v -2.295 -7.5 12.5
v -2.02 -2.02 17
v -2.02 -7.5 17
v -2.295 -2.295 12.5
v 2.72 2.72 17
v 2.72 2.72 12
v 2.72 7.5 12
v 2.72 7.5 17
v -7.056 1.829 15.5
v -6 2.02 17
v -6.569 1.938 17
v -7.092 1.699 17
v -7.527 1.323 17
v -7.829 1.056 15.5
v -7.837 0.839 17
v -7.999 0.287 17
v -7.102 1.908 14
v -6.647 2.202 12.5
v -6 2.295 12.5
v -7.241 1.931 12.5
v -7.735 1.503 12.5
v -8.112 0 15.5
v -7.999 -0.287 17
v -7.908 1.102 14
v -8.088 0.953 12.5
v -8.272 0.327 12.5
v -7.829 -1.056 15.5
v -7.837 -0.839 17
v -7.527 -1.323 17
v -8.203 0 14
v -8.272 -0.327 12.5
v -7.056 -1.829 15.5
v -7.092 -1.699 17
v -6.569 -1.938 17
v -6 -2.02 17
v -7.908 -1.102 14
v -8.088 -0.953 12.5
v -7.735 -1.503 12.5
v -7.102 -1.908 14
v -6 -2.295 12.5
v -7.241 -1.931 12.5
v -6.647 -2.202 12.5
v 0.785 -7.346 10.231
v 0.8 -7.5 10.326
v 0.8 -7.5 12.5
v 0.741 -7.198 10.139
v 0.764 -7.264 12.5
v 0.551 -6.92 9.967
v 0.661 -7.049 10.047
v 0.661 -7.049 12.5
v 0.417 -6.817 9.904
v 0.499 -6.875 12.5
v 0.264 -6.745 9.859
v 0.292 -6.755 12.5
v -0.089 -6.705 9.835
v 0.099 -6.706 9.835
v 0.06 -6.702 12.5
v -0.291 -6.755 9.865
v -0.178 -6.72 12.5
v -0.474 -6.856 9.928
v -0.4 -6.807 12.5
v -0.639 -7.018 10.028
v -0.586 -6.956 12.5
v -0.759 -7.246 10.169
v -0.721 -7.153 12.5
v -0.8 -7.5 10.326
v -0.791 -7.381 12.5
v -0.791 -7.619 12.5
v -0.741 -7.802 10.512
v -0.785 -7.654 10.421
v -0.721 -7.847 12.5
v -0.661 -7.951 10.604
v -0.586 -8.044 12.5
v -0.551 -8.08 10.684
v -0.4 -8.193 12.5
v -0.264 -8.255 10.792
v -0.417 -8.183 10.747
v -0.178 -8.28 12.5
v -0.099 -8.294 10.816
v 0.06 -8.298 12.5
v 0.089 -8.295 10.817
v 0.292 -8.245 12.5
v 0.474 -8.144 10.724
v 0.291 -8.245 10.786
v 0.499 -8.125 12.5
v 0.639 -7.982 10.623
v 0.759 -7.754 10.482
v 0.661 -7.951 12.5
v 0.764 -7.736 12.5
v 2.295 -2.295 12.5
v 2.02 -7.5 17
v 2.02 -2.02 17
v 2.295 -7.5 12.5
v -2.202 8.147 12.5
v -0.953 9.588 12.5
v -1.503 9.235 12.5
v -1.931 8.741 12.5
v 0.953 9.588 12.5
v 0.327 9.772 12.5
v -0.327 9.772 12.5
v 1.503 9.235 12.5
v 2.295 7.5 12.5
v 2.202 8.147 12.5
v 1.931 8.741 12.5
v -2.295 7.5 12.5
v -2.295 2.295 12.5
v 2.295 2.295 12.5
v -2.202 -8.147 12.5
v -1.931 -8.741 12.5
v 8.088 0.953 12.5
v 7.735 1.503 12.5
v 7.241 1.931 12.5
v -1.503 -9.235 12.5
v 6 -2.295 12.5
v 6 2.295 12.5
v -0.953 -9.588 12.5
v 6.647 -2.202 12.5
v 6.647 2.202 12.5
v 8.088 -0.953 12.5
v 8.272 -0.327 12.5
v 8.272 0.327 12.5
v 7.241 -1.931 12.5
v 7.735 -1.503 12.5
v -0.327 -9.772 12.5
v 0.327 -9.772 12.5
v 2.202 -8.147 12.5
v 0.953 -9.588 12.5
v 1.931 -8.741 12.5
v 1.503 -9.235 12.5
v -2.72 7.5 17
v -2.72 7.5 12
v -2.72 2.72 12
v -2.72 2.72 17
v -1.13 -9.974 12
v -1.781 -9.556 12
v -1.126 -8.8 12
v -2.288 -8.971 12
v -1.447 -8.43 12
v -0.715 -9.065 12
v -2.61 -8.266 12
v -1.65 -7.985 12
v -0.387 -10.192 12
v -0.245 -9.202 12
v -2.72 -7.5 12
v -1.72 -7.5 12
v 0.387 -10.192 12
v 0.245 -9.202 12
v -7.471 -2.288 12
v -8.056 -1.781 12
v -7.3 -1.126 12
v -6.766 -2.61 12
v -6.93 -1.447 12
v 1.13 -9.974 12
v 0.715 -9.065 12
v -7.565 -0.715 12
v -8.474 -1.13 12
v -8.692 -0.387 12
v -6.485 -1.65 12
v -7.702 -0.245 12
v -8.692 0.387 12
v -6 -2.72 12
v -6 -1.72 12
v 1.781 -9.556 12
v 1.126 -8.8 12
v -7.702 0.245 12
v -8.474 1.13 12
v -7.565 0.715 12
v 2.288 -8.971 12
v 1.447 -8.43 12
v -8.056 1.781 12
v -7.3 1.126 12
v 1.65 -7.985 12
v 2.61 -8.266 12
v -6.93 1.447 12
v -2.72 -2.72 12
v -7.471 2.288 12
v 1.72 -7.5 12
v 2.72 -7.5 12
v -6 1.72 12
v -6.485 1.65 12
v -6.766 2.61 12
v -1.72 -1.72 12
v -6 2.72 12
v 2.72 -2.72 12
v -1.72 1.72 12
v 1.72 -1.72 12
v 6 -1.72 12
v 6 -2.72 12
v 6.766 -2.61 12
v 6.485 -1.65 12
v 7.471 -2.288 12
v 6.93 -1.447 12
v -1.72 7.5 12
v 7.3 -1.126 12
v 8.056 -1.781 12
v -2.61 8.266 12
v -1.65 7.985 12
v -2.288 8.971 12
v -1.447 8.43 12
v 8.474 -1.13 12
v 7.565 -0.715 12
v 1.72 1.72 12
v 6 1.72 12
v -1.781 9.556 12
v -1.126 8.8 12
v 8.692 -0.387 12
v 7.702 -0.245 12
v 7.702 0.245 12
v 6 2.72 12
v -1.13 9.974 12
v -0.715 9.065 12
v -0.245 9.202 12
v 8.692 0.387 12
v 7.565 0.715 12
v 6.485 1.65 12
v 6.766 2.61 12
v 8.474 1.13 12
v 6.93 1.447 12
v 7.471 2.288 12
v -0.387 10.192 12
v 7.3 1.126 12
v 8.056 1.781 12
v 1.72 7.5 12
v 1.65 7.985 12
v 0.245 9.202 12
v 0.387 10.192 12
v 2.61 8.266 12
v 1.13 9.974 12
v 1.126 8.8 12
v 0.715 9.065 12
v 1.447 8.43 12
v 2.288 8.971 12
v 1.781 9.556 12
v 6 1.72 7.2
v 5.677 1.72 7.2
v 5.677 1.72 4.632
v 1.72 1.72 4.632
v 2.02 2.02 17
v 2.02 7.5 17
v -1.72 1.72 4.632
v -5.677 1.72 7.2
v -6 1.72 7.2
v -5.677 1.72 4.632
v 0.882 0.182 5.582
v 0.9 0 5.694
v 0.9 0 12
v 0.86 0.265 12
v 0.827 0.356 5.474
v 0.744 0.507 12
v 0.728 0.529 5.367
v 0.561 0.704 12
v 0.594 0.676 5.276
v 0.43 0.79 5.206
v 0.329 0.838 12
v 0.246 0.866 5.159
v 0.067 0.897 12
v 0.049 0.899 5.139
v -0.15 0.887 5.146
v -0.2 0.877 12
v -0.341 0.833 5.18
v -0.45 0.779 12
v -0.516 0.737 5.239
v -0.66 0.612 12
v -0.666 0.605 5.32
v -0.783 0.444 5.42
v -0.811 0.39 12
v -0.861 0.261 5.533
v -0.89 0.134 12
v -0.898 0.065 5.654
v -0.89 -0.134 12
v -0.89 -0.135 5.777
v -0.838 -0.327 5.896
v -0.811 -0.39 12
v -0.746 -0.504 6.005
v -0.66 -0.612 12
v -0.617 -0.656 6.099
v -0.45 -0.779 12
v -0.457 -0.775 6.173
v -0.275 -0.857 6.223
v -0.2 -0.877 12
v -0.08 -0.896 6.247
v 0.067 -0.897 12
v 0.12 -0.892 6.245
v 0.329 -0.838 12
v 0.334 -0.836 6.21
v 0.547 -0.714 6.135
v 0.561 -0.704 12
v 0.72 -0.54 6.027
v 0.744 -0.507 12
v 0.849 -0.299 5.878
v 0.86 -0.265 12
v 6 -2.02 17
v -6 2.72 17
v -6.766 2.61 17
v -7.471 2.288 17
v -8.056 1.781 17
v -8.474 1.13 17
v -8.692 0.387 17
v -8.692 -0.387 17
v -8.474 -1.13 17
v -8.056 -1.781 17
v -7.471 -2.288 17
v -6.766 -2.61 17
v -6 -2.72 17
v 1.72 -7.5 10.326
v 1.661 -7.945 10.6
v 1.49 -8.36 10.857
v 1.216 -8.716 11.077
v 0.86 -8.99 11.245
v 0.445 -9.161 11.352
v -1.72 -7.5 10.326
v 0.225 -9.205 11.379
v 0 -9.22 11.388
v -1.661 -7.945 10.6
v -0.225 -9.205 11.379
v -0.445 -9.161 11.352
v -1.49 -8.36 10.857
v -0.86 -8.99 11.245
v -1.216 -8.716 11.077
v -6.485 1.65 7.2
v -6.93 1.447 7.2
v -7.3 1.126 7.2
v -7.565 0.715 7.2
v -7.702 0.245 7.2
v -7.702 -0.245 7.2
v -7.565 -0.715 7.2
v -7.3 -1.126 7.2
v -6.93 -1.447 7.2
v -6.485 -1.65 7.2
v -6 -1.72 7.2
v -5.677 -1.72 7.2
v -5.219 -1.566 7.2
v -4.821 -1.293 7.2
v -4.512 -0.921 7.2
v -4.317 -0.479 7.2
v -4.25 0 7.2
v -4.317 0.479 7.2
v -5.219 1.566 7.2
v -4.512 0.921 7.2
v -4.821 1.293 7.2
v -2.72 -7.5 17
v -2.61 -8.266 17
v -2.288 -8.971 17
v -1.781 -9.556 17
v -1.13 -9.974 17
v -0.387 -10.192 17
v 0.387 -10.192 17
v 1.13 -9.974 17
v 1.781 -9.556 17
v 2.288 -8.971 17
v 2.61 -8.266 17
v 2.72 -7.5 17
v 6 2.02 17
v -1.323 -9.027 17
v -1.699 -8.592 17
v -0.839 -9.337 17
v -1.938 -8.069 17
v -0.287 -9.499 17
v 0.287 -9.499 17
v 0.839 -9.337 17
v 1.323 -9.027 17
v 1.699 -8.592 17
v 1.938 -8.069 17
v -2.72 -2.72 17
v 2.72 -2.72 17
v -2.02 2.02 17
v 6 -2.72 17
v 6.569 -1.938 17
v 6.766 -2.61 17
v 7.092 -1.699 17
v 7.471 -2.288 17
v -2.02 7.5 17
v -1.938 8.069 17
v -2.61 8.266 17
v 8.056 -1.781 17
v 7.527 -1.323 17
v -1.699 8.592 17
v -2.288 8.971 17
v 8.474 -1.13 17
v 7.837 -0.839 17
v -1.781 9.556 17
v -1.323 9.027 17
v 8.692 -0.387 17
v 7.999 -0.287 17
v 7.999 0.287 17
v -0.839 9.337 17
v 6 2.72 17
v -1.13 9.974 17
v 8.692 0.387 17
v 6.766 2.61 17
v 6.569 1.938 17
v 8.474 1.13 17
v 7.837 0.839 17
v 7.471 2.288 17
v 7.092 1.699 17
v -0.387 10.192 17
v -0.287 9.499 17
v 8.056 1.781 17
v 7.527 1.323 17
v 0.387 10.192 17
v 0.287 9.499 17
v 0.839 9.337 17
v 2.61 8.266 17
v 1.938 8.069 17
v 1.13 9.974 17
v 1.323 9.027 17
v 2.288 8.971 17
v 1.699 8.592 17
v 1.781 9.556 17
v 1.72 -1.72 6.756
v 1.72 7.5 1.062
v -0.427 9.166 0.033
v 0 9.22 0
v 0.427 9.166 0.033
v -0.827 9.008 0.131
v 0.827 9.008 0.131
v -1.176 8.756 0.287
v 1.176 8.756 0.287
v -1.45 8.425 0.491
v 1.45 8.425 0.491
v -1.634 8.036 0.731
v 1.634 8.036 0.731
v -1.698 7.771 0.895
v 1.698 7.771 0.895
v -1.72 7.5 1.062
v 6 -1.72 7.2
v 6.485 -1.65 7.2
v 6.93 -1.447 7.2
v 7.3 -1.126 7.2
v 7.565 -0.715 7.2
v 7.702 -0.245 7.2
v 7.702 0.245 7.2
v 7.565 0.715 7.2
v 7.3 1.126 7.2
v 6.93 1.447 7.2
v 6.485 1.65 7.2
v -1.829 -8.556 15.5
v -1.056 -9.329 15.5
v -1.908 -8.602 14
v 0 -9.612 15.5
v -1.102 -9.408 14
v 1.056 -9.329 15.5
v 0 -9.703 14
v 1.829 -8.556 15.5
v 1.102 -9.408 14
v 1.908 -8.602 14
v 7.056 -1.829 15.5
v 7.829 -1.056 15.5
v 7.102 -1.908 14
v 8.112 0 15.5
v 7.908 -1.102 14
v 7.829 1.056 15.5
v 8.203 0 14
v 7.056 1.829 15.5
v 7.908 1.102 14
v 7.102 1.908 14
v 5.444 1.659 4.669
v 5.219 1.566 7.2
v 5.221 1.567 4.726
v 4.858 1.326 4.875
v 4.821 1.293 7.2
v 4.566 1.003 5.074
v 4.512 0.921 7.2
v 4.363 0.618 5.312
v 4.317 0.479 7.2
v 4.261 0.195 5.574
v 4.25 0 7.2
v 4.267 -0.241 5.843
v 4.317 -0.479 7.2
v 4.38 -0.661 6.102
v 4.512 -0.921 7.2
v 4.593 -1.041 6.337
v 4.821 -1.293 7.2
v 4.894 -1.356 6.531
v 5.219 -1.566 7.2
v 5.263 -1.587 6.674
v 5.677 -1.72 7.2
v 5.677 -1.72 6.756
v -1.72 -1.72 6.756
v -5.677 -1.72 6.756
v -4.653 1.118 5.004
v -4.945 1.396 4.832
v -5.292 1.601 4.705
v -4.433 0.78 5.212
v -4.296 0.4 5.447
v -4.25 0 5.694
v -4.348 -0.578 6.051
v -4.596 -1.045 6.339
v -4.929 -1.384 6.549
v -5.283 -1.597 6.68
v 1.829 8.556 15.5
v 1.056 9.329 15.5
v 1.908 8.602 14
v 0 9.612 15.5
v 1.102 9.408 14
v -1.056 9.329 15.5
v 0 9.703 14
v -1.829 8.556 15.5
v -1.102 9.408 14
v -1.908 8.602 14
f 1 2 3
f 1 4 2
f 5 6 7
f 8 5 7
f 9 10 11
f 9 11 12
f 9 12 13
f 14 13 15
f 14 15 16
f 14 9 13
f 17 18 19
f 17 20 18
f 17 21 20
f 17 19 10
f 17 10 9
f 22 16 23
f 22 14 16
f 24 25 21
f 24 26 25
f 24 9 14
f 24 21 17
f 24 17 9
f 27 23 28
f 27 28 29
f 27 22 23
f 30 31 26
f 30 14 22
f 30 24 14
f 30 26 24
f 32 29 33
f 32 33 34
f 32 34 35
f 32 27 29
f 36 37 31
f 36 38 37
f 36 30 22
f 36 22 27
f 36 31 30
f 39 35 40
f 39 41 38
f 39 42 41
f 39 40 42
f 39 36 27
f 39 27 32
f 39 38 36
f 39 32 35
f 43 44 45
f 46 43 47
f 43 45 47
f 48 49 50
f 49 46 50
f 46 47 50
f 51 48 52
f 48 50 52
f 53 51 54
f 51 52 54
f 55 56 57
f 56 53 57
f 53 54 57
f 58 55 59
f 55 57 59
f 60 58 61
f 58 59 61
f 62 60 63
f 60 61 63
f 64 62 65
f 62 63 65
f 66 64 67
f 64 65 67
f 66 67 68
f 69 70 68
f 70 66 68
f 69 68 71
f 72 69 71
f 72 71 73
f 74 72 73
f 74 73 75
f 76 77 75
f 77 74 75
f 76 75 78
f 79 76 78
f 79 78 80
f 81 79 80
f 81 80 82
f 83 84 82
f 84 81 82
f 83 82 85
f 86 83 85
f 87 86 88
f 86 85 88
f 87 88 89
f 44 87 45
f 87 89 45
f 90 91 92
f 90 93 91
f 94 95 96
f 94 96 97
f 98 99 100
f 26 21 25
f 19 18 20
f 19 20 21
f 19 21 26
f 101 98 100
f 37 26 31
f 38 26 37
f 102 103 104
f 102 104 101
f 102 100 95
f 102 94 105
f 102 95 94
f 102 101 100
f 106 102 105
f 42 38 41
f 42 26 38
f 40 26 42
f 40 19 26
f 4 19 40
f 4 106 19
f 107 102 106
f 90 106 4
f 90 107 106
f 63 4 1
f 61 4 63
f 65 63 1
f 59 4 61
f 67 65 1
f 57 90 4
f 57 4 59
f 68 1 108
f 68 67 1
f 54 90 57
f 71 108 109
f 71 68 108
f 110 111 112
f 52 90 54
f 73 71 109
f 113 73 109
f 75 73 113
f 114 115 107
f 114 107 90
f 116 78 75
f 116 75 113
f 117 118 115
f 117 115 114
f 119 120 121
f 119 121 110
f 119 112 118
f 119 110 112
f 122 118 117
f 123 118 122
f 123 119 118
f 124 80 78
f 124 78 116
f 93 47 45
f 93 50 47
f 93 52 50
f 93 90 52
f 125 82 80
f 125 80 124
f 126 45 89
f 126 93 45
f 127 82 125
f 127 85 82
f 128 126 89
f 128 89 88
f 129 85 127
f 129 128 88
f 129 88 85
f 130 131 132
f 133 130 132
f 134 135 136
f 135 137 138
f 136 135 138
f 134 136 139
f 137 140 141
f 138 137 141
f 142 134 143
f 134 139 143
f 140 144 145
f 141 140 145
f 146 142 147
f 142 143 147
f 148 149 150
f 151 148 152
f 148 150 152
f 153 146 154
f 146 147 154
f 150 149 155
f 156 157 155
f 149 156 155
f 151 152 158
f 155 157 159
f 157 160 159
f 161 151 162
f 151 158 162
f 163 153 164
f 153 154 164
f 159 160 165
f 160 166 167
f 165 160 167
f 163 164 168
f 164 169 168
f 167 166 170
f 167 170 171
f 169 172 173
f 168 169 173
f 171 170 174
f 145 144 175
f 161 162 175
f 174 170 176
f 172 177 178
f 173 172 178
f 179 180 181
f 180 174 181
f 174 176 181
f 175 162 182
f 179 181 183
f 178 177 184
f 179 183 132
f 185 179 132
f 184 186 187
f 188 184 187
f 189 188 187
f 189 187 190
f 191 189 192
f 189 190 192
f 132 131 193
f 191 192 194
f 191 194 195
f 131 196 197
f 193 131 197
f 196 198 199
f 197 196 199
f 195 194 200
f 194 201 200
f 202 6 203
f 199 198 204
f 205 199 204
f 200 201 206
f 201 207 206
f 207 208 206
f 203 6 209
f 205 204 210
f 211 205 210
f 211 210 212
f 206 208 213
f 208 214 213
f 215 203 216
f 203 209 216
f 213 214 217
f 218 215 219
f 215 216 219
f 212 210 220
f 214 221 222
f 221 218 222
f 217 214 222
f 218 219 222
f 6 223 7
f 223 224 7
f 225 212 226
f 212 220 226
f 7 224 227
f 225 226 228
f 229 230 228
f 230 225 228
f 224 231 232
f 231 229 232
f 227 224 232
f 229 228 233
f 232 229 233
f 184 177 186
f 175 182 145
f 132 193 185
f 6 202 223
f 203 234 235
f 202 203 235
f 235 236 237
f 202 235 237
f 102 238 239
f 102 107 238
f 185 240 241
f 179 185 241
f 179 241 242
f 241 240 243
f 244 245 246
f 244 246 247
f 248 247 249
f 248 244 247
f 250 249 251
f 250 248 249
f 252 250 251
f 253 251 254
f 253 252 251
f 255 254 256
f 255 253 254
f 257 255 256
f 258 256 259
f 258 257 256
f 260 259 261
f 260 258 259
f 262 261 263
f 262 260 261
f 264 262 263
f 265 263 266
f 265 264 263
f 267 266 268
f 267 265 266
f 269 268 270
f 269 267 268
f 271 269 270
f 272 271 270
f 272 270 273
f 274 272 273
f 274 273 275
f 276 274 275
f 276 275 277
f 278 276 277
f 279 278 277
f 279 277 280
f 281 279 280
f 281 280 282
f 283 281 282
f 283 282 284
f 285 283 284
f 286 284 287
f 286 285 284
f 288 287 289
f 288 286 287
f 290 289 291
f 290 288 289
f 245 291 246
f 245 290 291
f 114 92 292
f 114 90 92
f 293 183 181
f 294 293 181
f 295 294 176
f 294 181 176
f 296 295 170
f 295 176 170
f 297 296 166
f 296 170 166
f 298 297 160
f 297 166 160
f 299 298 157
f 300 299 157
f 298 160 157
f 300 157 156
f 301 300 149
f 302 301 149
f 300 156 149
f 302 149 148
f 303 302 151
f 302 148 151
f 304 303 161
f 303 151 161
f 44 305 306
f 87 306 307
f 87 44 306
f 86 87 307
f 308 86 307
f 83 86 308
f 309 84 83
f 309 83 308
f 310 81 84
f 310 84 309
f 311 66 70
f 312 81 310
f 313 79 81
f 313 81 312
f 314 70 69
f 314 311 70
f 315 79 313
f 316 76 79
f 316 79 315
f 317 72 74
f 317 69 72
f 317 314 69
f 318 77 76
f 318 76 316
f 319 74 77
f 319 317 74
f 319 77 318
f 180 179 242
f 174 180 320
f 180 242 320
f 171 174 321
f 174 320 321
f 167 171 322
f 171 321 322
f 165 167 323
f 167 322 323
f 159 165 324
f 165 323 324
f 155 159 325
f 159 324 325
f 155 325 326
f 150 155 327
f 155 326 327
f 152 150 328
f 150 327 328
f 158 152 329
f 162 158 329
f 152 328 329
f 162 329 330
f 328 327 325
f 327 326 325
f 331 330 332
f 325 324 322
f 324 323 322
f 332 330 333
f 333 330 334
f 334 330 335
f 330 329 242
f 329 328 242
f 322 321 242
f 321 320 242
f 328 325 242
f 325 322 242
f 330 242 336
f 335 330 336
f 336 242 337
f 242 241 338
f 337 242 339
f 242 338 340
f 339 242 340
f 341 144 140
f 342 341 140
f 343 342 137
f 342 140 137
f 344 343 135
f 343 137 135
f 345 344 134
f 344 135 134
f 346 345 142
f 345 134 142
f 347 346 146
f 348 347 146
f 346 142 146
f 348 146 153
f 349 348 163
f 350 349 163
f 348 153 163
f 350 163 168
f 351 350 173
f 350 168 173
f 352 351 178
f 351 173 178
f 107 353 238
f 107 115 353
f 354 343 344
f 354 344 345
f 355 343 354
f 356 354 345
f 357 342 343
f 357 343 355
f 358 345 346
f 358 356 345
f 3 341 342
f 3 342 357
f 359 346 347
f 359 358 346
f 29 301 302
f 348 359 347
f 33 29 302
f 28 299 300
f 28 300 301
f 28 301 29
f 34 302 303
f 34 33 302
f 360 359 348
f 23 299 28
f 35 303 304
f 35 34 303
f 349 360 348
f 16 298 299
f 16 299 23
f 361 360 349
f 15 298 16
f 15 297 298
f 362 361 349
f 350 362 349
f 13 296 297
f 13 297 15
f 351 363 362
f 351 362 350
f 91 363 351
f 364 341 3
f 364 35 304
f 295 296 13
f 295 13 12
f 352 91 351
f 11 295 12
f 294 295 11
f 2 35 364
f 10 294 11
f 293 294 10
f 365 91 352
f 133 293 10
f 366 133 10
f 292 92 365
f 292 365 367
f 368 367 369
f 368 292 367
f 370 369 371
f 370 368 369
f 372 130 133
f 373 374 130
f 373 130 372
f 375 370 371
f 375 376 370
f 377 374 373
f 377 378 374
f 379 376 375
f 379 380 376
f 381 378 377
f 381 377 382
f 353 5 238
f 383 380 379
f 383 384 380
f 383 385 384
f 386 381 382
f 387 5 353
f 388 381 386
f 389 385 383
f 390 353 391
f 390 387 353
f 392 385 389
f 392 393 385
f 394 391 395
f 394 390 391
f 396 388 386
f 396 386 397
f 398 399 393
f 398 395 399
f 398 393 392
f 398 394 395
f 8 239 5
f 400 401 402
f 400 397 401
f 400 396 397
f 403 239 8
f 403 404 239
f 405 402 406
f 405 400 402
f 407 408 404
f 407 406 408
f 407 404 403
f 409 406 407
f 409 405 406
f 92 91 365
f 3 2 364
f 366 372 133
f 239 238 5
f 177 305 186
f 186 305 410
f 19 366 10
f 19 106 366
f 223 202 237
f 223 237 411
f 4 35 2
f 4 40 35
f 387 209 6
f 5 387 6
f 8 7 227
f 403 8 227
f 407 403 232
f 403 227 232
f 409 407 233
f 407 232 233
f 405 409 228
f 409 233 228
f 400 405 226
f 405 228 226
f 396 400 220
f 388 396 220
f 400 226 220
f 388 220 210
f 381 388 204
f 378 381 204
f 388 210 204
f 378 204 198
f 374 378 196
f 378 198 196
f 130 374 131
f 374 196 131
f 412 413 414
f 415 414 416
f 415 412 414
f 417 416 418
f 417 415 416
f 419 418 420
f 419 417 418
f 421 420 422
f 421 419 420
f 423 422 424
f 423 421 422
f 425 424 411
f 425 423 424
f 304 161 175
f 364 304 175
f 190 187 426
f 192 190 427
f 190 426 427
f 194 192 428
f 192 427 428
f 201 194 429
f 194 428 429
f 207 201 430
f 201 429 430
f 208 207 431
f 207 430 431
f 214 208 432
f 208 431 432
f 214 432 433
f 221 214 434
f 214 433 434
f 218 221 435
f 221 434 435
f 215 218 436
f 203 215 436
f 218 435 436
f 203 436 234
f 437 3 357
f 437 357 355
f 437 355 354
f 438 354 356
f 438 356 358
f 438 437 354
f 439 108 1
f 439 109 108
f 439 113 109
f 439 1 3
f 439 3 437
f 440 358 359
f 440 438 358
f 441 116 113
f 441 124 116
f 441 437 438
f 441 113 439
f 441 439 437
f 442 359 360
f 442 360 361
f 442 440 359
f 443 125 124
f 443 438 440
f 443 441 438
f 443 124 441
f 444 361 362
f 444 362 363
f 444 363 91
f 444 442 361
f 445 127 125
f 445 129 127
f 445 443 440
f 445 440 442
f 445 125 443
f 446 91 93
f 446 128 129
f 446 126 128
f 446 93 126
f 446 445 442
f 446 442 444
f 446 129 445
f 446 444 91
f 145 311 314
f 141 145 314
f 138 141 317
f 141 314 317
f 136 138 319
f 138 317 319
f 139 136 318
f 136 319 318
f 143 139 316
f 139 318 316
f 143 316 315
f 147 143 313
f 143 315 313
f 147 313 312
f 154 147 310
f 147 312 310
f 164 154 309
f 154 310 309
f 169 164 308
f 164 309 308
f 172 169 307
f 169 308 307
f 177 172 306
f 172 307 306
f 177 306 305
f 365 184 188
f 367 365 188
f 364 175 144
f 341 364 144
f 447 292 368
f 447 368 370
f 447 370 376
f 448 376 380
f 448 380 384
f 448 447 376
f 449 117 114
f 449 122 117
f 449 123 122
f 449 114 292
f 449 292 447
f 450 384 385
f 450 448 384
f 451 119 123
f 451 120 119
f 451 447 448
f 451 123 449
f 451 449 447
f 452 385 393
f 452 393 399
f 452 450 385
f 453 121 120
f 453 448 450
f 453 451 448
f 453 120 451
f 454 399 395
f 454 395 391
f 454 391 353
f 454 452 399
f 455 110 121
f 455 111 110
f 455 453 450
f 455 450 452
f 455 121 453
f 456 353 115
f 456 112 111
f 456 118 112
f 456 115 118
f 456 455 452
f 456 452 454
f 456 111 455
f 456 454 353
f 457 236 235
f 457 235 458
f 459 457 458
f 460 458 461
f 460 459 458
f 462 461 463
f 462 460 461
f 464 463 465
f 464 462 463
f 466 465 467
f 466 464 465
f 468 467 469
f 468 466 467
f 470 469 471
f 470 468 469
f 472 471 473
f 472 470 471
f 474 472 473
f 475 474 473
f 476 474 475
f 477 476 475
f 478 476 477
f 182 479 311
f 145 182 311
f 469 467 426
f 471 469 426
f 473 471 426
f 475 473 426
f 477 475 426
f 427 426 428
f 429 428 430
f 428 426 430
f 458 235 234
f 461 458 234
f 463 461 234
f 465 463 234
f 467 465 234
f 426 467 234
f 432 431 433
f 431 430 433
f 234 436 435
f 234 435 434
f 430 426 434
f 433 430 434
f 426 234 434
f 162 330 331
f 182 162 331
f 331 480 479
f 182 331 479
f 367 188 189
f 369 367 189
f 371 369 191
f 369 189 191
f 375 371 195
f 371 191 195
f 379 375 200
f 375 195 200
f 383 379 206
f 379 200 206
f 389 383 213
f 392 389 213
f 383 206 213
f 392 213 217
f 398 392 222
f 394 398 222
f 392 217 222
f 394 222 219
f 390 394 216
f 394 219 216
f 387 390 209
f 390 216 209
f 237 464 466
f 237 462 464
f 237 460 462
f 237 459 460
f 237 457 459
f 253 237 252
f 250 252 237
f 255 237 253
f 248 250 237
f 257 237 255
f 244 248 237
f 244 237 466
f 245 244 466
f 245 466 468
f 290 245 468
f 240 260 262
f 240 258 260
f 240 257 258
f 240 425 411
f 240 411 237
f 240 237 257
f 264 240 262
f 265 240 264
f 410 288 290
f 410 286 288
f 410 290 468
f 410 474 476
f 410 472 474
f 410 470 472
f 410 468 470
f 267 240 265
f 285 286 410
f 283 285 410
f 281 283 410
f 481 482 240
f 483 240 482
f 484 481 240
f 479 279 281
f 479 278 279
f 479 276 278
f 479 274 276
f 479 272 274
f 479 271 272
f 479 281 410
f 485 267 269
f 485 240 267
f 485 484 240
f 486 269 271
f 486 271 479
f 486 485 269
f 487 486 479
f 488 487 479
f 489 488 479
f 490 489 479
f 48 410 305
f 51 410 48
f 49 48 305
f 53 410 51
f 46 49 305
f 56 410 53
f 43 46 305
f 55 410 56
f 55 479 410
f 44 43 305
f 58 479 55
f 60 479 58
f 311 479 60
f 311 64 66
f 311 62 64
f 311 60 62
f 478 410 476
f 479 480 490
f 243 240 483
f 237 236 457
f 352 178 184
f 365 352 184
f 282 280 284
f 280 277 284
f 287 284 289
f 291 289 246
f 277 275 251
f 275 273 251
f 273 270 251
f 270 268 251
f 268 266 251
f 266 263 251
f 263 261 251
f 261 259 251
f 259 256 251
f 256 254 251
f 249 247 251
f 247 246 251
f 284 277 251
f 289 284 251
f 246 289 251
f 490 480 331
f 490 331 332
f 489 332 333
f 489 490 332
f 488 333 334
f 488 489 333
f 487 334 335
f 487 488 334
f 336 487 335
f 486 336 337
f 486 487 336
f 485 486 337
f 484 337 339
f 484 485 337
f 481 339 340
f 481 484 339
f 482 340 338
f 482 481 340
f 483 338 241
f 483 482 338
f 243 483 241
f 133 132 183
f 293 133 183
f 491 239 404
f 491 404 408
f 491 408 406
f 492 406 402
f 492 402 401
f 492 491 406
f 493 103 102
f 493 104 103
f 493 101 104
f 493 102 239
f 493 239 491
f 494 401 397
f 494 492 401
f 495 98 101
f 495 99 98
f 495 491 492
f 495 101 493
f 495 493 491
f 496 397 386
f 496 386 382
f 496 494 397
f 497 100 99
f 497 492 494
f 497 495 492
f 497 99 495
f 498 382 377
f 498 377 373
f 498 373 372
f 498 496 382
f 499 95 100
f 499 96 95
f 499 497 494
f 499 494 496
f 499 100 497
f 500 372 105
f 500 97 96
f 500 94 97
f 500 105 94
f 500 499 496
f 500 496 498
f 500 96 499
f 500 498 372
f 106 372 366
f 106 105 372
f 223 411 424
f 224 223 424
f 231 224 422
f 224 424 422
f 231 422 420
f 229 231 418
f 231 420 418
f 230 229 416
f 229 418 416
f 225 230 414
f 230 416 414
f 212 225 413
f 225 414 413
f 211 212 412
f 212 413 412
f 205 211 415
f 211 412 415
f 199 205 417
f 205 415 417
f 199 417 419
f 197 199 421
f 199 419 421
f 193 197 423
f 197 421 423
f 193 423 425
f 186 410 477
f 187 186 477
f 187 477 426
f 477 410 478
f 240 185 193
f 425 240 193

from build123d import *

# Parameters (mm, degrees)
F0_W          = 4.28
F0_H          = 3.44
F0_W_2        = 3.44
F0_H_2        = 5.78
F1_DEPTH      = 12
F3_DEPTH      = 25
F3_DEPTH_BACK = 25
F4_R          = 1.75
F5_DEPTH      = 7.2
F6_R          = 0.9
F7_DEPTH      = 55
F8_R          = 0.9
F10_DEPTH     = 5
F11_R         = 0.8
F12_DEPTH     = 17.001
F14_DEPTH     = 4.5
F14_TAPER     = -3.5


with BuildPart() as f1:
    # F0 (on Top) → F1 (new body)
    with BuildSketch(Plane.XY):
        with Locations((3.86, 0)):
            Rectangle(F0_W, F0_H)
        with BuildLine():
            Line((6, 1.72), (6, -1.72))
            ThreePointArc((6, -1.72), (7.72, 0), (6, 1.72))
        make_face()
        with Locations((0, -4.61)):
            Rectangle(F0_W_2, F0_H_2)
        Rectangle(F0_W_2, F0_H)
        with Locations((-3.86, 0)):
            Rectangle(F0_W, F0_H)
        with BuildLine():
            ThreePointArc((-1.72, -7.5), (0, -9.22), (1.72, -7.5))
            Line((1.72, -7.5), (-1.72, -7.5))
        make_face()
        with Locations((0, 4.61)):
            Rectangle(F0_W_2, F0_H_2)
        with BuildLine():
            ThreePointArc((-6, 1.72), (-7.72, 0), (-6, -1.72))
            Line((-6, -1.72), (-6, 1.72))
        make_face()
        with BuildLine():
            Line((-1.72, 7.5), (1.72, 7.5))
            ThreePointArc((1.72, 7.5), (0, 9.22), (-1.72, 7.5))
        make_face()
    extrude(amount=F1_DEPTH)

    # F2 (on Right) → F3 (cut, two sides)
    with BuildSketch(Plane.YZ) as f3_sk:
        Polygon((-7.5, 0), (7.5, 0), (7.5, 1.0621960754), (-7.5, 10.3255339419), align=None)
        Polygon((7.5, 1.0621960754), (7.5, 0), (9.22, 0), align=None)
        Polygon((-9.22, 0), (-7.5, 0), (-7.5, 10.3255339419), (-9.22, 11.3877300173), align=None)
    extrude(amount=-F3_DEPTH, mode=Mode.SUBTRACT)
    extrude(f3_sk.sketch, amount=F3_DEPTH_BACK, mode=Mode.SUBTRACT)

    # F4 (on Top) → F5 (cut)
    with BuildSketch(Plane.XY):
        with Locations((6, 0)):
            Circle(F4_R)
        with Locations((-6, 0)):
            Circle(F4_R)
    extrude(amount=F5_DEPTH, mode=Mode.SUBTRACT)

    # F6 (on Top) → F7 (cut)
    with BuildSketch(Plane.XY):
        Circle(F6_R)
    extrude(amount=F7_DEPTH, mode=Mode.SUBTRACT)

    # F8 (on face) + F9 (on face) → F10 (join)
    with BuildSketch(Plane.XY.offset(12)):
        with BuildLine():
            Line((1.72, -7.5), (1.72, -1.72))
            Line((1.72, -1.72), (6, -1.72))
            ThreePointArc((6, -1.72), (7.72, 0), (6, 1.72))
            Line((6, 1.72), (1.72, 1.72))
            Line((1.72, 1.72), (1.72, 7.5))
            ThreePointArc((1.72, 7.5), (0, 9.22), (-1.72, 7.5))
            Line((-1.72, 7.5), (-1.72, 1.72))
            Line((-1.72, 1.72), (-6, 1.72))
            ThreePointArc((-6, 1.72), (-7.72, 0), (-6, -1.72))
            Line((-6, -1.72), (-1.72, -1.72))
            Line((-1.72, -1.72), (-1.72, -7.5))
            ThreePointArc((-1.72, -7.5), (0, -9.22), (1.72, -7.5))
        make_face()
        Circle(F8_R, mode=Mode.SUBTRACT)
    with BuildSketch(Plane.XY.offset(12)):
        with BuildLine():
            ThreePointArc((-2.7199999895, -7.5), (0, -10.2199999895), (2.7199999895, -7.5))
            Line((2.7199999895, -7.5), (2.7199999895, -2.7199999895))
            Line((2.7199999895, -2.7199999895), (6, -2.7199999895))
            ThreePointArc((6, -2.7199999895), (8.7199999895, 0), (6, 2.7199999895))
            Line((6, 2.7199999895), (2.7199999895, 2.7199999895))
            Line((2.7199999895, 2.7199999895), (2.7199999895, 7.5))
            ThreePointArc((2.7199999895, 7.5), (0, 10.2199999895), (-2.7199999895, 7.5))
            Line((-2.7199999895, 7.5), (-2.7199999895, 2.7199999895))
            Line((-2.7199999895, 2.7199999895), (-6, 2.7199999895))
            ThreePointArc((-6, 2.7199999895), (-8.7199999895, 0), (-6, -2.7199999895))
            Line((-6, -2.7199999895), (-2.7199999895, -2.7199999895))
            Line((-2.7199999895, -2.7199999895), (-2.7199999895, -7.5))
        make_face()
    extrude(amount=F10_DEPTH)

    # F11 (on face) → F12 (cut, through all)
    with BuildSketch(Plane.XY.offset(17)):
        with Locations((0, -7.5)):
            Circle(F11_R)
    extrude(amount=-F12_DEPTH, mode=Mode.SUBTRACT)

    # F13 (on face) → F14 (cut)
    with BuildSketch(Plane.XY.offset(17)):
        with BuildLine():
            Line((2.02, -2.02), (6, -2.02))
            ThreePointArc((6, -2.02), (8.02, 0), (6, 2.02))
            Line((6, 2.02), (2.02, 2.02))
            Line((2.02, 2.02), (2.02, 7.5))
            ThreePointArc((2.02, 7.5), (0, 9.52), (-2.02, 7.5))
            Line((-2.02, 7.5), (-2.02, 2.02))
            Line((-2.02, 2.02), (-6, 2.02))
            ThreePointArc((-6, 2.02), (-8.02, 0), (-6, -2.02))
            Line((-6, -2.02), (-2.02, -2.02))
            Line((-2.02, -2.02), (-2.02, -7.5))
            ThreePointArc((-2.02, -7.5), (0, -9.52), (2.02, -7.5))
            Line((2.02, -7.5), (2.02, -2.02))
        make_face()
    extrude(amount=-F14_DEPTH, taper=F14_TAPER, mode=Mode.SUBTRACT)


solid = f1.part
